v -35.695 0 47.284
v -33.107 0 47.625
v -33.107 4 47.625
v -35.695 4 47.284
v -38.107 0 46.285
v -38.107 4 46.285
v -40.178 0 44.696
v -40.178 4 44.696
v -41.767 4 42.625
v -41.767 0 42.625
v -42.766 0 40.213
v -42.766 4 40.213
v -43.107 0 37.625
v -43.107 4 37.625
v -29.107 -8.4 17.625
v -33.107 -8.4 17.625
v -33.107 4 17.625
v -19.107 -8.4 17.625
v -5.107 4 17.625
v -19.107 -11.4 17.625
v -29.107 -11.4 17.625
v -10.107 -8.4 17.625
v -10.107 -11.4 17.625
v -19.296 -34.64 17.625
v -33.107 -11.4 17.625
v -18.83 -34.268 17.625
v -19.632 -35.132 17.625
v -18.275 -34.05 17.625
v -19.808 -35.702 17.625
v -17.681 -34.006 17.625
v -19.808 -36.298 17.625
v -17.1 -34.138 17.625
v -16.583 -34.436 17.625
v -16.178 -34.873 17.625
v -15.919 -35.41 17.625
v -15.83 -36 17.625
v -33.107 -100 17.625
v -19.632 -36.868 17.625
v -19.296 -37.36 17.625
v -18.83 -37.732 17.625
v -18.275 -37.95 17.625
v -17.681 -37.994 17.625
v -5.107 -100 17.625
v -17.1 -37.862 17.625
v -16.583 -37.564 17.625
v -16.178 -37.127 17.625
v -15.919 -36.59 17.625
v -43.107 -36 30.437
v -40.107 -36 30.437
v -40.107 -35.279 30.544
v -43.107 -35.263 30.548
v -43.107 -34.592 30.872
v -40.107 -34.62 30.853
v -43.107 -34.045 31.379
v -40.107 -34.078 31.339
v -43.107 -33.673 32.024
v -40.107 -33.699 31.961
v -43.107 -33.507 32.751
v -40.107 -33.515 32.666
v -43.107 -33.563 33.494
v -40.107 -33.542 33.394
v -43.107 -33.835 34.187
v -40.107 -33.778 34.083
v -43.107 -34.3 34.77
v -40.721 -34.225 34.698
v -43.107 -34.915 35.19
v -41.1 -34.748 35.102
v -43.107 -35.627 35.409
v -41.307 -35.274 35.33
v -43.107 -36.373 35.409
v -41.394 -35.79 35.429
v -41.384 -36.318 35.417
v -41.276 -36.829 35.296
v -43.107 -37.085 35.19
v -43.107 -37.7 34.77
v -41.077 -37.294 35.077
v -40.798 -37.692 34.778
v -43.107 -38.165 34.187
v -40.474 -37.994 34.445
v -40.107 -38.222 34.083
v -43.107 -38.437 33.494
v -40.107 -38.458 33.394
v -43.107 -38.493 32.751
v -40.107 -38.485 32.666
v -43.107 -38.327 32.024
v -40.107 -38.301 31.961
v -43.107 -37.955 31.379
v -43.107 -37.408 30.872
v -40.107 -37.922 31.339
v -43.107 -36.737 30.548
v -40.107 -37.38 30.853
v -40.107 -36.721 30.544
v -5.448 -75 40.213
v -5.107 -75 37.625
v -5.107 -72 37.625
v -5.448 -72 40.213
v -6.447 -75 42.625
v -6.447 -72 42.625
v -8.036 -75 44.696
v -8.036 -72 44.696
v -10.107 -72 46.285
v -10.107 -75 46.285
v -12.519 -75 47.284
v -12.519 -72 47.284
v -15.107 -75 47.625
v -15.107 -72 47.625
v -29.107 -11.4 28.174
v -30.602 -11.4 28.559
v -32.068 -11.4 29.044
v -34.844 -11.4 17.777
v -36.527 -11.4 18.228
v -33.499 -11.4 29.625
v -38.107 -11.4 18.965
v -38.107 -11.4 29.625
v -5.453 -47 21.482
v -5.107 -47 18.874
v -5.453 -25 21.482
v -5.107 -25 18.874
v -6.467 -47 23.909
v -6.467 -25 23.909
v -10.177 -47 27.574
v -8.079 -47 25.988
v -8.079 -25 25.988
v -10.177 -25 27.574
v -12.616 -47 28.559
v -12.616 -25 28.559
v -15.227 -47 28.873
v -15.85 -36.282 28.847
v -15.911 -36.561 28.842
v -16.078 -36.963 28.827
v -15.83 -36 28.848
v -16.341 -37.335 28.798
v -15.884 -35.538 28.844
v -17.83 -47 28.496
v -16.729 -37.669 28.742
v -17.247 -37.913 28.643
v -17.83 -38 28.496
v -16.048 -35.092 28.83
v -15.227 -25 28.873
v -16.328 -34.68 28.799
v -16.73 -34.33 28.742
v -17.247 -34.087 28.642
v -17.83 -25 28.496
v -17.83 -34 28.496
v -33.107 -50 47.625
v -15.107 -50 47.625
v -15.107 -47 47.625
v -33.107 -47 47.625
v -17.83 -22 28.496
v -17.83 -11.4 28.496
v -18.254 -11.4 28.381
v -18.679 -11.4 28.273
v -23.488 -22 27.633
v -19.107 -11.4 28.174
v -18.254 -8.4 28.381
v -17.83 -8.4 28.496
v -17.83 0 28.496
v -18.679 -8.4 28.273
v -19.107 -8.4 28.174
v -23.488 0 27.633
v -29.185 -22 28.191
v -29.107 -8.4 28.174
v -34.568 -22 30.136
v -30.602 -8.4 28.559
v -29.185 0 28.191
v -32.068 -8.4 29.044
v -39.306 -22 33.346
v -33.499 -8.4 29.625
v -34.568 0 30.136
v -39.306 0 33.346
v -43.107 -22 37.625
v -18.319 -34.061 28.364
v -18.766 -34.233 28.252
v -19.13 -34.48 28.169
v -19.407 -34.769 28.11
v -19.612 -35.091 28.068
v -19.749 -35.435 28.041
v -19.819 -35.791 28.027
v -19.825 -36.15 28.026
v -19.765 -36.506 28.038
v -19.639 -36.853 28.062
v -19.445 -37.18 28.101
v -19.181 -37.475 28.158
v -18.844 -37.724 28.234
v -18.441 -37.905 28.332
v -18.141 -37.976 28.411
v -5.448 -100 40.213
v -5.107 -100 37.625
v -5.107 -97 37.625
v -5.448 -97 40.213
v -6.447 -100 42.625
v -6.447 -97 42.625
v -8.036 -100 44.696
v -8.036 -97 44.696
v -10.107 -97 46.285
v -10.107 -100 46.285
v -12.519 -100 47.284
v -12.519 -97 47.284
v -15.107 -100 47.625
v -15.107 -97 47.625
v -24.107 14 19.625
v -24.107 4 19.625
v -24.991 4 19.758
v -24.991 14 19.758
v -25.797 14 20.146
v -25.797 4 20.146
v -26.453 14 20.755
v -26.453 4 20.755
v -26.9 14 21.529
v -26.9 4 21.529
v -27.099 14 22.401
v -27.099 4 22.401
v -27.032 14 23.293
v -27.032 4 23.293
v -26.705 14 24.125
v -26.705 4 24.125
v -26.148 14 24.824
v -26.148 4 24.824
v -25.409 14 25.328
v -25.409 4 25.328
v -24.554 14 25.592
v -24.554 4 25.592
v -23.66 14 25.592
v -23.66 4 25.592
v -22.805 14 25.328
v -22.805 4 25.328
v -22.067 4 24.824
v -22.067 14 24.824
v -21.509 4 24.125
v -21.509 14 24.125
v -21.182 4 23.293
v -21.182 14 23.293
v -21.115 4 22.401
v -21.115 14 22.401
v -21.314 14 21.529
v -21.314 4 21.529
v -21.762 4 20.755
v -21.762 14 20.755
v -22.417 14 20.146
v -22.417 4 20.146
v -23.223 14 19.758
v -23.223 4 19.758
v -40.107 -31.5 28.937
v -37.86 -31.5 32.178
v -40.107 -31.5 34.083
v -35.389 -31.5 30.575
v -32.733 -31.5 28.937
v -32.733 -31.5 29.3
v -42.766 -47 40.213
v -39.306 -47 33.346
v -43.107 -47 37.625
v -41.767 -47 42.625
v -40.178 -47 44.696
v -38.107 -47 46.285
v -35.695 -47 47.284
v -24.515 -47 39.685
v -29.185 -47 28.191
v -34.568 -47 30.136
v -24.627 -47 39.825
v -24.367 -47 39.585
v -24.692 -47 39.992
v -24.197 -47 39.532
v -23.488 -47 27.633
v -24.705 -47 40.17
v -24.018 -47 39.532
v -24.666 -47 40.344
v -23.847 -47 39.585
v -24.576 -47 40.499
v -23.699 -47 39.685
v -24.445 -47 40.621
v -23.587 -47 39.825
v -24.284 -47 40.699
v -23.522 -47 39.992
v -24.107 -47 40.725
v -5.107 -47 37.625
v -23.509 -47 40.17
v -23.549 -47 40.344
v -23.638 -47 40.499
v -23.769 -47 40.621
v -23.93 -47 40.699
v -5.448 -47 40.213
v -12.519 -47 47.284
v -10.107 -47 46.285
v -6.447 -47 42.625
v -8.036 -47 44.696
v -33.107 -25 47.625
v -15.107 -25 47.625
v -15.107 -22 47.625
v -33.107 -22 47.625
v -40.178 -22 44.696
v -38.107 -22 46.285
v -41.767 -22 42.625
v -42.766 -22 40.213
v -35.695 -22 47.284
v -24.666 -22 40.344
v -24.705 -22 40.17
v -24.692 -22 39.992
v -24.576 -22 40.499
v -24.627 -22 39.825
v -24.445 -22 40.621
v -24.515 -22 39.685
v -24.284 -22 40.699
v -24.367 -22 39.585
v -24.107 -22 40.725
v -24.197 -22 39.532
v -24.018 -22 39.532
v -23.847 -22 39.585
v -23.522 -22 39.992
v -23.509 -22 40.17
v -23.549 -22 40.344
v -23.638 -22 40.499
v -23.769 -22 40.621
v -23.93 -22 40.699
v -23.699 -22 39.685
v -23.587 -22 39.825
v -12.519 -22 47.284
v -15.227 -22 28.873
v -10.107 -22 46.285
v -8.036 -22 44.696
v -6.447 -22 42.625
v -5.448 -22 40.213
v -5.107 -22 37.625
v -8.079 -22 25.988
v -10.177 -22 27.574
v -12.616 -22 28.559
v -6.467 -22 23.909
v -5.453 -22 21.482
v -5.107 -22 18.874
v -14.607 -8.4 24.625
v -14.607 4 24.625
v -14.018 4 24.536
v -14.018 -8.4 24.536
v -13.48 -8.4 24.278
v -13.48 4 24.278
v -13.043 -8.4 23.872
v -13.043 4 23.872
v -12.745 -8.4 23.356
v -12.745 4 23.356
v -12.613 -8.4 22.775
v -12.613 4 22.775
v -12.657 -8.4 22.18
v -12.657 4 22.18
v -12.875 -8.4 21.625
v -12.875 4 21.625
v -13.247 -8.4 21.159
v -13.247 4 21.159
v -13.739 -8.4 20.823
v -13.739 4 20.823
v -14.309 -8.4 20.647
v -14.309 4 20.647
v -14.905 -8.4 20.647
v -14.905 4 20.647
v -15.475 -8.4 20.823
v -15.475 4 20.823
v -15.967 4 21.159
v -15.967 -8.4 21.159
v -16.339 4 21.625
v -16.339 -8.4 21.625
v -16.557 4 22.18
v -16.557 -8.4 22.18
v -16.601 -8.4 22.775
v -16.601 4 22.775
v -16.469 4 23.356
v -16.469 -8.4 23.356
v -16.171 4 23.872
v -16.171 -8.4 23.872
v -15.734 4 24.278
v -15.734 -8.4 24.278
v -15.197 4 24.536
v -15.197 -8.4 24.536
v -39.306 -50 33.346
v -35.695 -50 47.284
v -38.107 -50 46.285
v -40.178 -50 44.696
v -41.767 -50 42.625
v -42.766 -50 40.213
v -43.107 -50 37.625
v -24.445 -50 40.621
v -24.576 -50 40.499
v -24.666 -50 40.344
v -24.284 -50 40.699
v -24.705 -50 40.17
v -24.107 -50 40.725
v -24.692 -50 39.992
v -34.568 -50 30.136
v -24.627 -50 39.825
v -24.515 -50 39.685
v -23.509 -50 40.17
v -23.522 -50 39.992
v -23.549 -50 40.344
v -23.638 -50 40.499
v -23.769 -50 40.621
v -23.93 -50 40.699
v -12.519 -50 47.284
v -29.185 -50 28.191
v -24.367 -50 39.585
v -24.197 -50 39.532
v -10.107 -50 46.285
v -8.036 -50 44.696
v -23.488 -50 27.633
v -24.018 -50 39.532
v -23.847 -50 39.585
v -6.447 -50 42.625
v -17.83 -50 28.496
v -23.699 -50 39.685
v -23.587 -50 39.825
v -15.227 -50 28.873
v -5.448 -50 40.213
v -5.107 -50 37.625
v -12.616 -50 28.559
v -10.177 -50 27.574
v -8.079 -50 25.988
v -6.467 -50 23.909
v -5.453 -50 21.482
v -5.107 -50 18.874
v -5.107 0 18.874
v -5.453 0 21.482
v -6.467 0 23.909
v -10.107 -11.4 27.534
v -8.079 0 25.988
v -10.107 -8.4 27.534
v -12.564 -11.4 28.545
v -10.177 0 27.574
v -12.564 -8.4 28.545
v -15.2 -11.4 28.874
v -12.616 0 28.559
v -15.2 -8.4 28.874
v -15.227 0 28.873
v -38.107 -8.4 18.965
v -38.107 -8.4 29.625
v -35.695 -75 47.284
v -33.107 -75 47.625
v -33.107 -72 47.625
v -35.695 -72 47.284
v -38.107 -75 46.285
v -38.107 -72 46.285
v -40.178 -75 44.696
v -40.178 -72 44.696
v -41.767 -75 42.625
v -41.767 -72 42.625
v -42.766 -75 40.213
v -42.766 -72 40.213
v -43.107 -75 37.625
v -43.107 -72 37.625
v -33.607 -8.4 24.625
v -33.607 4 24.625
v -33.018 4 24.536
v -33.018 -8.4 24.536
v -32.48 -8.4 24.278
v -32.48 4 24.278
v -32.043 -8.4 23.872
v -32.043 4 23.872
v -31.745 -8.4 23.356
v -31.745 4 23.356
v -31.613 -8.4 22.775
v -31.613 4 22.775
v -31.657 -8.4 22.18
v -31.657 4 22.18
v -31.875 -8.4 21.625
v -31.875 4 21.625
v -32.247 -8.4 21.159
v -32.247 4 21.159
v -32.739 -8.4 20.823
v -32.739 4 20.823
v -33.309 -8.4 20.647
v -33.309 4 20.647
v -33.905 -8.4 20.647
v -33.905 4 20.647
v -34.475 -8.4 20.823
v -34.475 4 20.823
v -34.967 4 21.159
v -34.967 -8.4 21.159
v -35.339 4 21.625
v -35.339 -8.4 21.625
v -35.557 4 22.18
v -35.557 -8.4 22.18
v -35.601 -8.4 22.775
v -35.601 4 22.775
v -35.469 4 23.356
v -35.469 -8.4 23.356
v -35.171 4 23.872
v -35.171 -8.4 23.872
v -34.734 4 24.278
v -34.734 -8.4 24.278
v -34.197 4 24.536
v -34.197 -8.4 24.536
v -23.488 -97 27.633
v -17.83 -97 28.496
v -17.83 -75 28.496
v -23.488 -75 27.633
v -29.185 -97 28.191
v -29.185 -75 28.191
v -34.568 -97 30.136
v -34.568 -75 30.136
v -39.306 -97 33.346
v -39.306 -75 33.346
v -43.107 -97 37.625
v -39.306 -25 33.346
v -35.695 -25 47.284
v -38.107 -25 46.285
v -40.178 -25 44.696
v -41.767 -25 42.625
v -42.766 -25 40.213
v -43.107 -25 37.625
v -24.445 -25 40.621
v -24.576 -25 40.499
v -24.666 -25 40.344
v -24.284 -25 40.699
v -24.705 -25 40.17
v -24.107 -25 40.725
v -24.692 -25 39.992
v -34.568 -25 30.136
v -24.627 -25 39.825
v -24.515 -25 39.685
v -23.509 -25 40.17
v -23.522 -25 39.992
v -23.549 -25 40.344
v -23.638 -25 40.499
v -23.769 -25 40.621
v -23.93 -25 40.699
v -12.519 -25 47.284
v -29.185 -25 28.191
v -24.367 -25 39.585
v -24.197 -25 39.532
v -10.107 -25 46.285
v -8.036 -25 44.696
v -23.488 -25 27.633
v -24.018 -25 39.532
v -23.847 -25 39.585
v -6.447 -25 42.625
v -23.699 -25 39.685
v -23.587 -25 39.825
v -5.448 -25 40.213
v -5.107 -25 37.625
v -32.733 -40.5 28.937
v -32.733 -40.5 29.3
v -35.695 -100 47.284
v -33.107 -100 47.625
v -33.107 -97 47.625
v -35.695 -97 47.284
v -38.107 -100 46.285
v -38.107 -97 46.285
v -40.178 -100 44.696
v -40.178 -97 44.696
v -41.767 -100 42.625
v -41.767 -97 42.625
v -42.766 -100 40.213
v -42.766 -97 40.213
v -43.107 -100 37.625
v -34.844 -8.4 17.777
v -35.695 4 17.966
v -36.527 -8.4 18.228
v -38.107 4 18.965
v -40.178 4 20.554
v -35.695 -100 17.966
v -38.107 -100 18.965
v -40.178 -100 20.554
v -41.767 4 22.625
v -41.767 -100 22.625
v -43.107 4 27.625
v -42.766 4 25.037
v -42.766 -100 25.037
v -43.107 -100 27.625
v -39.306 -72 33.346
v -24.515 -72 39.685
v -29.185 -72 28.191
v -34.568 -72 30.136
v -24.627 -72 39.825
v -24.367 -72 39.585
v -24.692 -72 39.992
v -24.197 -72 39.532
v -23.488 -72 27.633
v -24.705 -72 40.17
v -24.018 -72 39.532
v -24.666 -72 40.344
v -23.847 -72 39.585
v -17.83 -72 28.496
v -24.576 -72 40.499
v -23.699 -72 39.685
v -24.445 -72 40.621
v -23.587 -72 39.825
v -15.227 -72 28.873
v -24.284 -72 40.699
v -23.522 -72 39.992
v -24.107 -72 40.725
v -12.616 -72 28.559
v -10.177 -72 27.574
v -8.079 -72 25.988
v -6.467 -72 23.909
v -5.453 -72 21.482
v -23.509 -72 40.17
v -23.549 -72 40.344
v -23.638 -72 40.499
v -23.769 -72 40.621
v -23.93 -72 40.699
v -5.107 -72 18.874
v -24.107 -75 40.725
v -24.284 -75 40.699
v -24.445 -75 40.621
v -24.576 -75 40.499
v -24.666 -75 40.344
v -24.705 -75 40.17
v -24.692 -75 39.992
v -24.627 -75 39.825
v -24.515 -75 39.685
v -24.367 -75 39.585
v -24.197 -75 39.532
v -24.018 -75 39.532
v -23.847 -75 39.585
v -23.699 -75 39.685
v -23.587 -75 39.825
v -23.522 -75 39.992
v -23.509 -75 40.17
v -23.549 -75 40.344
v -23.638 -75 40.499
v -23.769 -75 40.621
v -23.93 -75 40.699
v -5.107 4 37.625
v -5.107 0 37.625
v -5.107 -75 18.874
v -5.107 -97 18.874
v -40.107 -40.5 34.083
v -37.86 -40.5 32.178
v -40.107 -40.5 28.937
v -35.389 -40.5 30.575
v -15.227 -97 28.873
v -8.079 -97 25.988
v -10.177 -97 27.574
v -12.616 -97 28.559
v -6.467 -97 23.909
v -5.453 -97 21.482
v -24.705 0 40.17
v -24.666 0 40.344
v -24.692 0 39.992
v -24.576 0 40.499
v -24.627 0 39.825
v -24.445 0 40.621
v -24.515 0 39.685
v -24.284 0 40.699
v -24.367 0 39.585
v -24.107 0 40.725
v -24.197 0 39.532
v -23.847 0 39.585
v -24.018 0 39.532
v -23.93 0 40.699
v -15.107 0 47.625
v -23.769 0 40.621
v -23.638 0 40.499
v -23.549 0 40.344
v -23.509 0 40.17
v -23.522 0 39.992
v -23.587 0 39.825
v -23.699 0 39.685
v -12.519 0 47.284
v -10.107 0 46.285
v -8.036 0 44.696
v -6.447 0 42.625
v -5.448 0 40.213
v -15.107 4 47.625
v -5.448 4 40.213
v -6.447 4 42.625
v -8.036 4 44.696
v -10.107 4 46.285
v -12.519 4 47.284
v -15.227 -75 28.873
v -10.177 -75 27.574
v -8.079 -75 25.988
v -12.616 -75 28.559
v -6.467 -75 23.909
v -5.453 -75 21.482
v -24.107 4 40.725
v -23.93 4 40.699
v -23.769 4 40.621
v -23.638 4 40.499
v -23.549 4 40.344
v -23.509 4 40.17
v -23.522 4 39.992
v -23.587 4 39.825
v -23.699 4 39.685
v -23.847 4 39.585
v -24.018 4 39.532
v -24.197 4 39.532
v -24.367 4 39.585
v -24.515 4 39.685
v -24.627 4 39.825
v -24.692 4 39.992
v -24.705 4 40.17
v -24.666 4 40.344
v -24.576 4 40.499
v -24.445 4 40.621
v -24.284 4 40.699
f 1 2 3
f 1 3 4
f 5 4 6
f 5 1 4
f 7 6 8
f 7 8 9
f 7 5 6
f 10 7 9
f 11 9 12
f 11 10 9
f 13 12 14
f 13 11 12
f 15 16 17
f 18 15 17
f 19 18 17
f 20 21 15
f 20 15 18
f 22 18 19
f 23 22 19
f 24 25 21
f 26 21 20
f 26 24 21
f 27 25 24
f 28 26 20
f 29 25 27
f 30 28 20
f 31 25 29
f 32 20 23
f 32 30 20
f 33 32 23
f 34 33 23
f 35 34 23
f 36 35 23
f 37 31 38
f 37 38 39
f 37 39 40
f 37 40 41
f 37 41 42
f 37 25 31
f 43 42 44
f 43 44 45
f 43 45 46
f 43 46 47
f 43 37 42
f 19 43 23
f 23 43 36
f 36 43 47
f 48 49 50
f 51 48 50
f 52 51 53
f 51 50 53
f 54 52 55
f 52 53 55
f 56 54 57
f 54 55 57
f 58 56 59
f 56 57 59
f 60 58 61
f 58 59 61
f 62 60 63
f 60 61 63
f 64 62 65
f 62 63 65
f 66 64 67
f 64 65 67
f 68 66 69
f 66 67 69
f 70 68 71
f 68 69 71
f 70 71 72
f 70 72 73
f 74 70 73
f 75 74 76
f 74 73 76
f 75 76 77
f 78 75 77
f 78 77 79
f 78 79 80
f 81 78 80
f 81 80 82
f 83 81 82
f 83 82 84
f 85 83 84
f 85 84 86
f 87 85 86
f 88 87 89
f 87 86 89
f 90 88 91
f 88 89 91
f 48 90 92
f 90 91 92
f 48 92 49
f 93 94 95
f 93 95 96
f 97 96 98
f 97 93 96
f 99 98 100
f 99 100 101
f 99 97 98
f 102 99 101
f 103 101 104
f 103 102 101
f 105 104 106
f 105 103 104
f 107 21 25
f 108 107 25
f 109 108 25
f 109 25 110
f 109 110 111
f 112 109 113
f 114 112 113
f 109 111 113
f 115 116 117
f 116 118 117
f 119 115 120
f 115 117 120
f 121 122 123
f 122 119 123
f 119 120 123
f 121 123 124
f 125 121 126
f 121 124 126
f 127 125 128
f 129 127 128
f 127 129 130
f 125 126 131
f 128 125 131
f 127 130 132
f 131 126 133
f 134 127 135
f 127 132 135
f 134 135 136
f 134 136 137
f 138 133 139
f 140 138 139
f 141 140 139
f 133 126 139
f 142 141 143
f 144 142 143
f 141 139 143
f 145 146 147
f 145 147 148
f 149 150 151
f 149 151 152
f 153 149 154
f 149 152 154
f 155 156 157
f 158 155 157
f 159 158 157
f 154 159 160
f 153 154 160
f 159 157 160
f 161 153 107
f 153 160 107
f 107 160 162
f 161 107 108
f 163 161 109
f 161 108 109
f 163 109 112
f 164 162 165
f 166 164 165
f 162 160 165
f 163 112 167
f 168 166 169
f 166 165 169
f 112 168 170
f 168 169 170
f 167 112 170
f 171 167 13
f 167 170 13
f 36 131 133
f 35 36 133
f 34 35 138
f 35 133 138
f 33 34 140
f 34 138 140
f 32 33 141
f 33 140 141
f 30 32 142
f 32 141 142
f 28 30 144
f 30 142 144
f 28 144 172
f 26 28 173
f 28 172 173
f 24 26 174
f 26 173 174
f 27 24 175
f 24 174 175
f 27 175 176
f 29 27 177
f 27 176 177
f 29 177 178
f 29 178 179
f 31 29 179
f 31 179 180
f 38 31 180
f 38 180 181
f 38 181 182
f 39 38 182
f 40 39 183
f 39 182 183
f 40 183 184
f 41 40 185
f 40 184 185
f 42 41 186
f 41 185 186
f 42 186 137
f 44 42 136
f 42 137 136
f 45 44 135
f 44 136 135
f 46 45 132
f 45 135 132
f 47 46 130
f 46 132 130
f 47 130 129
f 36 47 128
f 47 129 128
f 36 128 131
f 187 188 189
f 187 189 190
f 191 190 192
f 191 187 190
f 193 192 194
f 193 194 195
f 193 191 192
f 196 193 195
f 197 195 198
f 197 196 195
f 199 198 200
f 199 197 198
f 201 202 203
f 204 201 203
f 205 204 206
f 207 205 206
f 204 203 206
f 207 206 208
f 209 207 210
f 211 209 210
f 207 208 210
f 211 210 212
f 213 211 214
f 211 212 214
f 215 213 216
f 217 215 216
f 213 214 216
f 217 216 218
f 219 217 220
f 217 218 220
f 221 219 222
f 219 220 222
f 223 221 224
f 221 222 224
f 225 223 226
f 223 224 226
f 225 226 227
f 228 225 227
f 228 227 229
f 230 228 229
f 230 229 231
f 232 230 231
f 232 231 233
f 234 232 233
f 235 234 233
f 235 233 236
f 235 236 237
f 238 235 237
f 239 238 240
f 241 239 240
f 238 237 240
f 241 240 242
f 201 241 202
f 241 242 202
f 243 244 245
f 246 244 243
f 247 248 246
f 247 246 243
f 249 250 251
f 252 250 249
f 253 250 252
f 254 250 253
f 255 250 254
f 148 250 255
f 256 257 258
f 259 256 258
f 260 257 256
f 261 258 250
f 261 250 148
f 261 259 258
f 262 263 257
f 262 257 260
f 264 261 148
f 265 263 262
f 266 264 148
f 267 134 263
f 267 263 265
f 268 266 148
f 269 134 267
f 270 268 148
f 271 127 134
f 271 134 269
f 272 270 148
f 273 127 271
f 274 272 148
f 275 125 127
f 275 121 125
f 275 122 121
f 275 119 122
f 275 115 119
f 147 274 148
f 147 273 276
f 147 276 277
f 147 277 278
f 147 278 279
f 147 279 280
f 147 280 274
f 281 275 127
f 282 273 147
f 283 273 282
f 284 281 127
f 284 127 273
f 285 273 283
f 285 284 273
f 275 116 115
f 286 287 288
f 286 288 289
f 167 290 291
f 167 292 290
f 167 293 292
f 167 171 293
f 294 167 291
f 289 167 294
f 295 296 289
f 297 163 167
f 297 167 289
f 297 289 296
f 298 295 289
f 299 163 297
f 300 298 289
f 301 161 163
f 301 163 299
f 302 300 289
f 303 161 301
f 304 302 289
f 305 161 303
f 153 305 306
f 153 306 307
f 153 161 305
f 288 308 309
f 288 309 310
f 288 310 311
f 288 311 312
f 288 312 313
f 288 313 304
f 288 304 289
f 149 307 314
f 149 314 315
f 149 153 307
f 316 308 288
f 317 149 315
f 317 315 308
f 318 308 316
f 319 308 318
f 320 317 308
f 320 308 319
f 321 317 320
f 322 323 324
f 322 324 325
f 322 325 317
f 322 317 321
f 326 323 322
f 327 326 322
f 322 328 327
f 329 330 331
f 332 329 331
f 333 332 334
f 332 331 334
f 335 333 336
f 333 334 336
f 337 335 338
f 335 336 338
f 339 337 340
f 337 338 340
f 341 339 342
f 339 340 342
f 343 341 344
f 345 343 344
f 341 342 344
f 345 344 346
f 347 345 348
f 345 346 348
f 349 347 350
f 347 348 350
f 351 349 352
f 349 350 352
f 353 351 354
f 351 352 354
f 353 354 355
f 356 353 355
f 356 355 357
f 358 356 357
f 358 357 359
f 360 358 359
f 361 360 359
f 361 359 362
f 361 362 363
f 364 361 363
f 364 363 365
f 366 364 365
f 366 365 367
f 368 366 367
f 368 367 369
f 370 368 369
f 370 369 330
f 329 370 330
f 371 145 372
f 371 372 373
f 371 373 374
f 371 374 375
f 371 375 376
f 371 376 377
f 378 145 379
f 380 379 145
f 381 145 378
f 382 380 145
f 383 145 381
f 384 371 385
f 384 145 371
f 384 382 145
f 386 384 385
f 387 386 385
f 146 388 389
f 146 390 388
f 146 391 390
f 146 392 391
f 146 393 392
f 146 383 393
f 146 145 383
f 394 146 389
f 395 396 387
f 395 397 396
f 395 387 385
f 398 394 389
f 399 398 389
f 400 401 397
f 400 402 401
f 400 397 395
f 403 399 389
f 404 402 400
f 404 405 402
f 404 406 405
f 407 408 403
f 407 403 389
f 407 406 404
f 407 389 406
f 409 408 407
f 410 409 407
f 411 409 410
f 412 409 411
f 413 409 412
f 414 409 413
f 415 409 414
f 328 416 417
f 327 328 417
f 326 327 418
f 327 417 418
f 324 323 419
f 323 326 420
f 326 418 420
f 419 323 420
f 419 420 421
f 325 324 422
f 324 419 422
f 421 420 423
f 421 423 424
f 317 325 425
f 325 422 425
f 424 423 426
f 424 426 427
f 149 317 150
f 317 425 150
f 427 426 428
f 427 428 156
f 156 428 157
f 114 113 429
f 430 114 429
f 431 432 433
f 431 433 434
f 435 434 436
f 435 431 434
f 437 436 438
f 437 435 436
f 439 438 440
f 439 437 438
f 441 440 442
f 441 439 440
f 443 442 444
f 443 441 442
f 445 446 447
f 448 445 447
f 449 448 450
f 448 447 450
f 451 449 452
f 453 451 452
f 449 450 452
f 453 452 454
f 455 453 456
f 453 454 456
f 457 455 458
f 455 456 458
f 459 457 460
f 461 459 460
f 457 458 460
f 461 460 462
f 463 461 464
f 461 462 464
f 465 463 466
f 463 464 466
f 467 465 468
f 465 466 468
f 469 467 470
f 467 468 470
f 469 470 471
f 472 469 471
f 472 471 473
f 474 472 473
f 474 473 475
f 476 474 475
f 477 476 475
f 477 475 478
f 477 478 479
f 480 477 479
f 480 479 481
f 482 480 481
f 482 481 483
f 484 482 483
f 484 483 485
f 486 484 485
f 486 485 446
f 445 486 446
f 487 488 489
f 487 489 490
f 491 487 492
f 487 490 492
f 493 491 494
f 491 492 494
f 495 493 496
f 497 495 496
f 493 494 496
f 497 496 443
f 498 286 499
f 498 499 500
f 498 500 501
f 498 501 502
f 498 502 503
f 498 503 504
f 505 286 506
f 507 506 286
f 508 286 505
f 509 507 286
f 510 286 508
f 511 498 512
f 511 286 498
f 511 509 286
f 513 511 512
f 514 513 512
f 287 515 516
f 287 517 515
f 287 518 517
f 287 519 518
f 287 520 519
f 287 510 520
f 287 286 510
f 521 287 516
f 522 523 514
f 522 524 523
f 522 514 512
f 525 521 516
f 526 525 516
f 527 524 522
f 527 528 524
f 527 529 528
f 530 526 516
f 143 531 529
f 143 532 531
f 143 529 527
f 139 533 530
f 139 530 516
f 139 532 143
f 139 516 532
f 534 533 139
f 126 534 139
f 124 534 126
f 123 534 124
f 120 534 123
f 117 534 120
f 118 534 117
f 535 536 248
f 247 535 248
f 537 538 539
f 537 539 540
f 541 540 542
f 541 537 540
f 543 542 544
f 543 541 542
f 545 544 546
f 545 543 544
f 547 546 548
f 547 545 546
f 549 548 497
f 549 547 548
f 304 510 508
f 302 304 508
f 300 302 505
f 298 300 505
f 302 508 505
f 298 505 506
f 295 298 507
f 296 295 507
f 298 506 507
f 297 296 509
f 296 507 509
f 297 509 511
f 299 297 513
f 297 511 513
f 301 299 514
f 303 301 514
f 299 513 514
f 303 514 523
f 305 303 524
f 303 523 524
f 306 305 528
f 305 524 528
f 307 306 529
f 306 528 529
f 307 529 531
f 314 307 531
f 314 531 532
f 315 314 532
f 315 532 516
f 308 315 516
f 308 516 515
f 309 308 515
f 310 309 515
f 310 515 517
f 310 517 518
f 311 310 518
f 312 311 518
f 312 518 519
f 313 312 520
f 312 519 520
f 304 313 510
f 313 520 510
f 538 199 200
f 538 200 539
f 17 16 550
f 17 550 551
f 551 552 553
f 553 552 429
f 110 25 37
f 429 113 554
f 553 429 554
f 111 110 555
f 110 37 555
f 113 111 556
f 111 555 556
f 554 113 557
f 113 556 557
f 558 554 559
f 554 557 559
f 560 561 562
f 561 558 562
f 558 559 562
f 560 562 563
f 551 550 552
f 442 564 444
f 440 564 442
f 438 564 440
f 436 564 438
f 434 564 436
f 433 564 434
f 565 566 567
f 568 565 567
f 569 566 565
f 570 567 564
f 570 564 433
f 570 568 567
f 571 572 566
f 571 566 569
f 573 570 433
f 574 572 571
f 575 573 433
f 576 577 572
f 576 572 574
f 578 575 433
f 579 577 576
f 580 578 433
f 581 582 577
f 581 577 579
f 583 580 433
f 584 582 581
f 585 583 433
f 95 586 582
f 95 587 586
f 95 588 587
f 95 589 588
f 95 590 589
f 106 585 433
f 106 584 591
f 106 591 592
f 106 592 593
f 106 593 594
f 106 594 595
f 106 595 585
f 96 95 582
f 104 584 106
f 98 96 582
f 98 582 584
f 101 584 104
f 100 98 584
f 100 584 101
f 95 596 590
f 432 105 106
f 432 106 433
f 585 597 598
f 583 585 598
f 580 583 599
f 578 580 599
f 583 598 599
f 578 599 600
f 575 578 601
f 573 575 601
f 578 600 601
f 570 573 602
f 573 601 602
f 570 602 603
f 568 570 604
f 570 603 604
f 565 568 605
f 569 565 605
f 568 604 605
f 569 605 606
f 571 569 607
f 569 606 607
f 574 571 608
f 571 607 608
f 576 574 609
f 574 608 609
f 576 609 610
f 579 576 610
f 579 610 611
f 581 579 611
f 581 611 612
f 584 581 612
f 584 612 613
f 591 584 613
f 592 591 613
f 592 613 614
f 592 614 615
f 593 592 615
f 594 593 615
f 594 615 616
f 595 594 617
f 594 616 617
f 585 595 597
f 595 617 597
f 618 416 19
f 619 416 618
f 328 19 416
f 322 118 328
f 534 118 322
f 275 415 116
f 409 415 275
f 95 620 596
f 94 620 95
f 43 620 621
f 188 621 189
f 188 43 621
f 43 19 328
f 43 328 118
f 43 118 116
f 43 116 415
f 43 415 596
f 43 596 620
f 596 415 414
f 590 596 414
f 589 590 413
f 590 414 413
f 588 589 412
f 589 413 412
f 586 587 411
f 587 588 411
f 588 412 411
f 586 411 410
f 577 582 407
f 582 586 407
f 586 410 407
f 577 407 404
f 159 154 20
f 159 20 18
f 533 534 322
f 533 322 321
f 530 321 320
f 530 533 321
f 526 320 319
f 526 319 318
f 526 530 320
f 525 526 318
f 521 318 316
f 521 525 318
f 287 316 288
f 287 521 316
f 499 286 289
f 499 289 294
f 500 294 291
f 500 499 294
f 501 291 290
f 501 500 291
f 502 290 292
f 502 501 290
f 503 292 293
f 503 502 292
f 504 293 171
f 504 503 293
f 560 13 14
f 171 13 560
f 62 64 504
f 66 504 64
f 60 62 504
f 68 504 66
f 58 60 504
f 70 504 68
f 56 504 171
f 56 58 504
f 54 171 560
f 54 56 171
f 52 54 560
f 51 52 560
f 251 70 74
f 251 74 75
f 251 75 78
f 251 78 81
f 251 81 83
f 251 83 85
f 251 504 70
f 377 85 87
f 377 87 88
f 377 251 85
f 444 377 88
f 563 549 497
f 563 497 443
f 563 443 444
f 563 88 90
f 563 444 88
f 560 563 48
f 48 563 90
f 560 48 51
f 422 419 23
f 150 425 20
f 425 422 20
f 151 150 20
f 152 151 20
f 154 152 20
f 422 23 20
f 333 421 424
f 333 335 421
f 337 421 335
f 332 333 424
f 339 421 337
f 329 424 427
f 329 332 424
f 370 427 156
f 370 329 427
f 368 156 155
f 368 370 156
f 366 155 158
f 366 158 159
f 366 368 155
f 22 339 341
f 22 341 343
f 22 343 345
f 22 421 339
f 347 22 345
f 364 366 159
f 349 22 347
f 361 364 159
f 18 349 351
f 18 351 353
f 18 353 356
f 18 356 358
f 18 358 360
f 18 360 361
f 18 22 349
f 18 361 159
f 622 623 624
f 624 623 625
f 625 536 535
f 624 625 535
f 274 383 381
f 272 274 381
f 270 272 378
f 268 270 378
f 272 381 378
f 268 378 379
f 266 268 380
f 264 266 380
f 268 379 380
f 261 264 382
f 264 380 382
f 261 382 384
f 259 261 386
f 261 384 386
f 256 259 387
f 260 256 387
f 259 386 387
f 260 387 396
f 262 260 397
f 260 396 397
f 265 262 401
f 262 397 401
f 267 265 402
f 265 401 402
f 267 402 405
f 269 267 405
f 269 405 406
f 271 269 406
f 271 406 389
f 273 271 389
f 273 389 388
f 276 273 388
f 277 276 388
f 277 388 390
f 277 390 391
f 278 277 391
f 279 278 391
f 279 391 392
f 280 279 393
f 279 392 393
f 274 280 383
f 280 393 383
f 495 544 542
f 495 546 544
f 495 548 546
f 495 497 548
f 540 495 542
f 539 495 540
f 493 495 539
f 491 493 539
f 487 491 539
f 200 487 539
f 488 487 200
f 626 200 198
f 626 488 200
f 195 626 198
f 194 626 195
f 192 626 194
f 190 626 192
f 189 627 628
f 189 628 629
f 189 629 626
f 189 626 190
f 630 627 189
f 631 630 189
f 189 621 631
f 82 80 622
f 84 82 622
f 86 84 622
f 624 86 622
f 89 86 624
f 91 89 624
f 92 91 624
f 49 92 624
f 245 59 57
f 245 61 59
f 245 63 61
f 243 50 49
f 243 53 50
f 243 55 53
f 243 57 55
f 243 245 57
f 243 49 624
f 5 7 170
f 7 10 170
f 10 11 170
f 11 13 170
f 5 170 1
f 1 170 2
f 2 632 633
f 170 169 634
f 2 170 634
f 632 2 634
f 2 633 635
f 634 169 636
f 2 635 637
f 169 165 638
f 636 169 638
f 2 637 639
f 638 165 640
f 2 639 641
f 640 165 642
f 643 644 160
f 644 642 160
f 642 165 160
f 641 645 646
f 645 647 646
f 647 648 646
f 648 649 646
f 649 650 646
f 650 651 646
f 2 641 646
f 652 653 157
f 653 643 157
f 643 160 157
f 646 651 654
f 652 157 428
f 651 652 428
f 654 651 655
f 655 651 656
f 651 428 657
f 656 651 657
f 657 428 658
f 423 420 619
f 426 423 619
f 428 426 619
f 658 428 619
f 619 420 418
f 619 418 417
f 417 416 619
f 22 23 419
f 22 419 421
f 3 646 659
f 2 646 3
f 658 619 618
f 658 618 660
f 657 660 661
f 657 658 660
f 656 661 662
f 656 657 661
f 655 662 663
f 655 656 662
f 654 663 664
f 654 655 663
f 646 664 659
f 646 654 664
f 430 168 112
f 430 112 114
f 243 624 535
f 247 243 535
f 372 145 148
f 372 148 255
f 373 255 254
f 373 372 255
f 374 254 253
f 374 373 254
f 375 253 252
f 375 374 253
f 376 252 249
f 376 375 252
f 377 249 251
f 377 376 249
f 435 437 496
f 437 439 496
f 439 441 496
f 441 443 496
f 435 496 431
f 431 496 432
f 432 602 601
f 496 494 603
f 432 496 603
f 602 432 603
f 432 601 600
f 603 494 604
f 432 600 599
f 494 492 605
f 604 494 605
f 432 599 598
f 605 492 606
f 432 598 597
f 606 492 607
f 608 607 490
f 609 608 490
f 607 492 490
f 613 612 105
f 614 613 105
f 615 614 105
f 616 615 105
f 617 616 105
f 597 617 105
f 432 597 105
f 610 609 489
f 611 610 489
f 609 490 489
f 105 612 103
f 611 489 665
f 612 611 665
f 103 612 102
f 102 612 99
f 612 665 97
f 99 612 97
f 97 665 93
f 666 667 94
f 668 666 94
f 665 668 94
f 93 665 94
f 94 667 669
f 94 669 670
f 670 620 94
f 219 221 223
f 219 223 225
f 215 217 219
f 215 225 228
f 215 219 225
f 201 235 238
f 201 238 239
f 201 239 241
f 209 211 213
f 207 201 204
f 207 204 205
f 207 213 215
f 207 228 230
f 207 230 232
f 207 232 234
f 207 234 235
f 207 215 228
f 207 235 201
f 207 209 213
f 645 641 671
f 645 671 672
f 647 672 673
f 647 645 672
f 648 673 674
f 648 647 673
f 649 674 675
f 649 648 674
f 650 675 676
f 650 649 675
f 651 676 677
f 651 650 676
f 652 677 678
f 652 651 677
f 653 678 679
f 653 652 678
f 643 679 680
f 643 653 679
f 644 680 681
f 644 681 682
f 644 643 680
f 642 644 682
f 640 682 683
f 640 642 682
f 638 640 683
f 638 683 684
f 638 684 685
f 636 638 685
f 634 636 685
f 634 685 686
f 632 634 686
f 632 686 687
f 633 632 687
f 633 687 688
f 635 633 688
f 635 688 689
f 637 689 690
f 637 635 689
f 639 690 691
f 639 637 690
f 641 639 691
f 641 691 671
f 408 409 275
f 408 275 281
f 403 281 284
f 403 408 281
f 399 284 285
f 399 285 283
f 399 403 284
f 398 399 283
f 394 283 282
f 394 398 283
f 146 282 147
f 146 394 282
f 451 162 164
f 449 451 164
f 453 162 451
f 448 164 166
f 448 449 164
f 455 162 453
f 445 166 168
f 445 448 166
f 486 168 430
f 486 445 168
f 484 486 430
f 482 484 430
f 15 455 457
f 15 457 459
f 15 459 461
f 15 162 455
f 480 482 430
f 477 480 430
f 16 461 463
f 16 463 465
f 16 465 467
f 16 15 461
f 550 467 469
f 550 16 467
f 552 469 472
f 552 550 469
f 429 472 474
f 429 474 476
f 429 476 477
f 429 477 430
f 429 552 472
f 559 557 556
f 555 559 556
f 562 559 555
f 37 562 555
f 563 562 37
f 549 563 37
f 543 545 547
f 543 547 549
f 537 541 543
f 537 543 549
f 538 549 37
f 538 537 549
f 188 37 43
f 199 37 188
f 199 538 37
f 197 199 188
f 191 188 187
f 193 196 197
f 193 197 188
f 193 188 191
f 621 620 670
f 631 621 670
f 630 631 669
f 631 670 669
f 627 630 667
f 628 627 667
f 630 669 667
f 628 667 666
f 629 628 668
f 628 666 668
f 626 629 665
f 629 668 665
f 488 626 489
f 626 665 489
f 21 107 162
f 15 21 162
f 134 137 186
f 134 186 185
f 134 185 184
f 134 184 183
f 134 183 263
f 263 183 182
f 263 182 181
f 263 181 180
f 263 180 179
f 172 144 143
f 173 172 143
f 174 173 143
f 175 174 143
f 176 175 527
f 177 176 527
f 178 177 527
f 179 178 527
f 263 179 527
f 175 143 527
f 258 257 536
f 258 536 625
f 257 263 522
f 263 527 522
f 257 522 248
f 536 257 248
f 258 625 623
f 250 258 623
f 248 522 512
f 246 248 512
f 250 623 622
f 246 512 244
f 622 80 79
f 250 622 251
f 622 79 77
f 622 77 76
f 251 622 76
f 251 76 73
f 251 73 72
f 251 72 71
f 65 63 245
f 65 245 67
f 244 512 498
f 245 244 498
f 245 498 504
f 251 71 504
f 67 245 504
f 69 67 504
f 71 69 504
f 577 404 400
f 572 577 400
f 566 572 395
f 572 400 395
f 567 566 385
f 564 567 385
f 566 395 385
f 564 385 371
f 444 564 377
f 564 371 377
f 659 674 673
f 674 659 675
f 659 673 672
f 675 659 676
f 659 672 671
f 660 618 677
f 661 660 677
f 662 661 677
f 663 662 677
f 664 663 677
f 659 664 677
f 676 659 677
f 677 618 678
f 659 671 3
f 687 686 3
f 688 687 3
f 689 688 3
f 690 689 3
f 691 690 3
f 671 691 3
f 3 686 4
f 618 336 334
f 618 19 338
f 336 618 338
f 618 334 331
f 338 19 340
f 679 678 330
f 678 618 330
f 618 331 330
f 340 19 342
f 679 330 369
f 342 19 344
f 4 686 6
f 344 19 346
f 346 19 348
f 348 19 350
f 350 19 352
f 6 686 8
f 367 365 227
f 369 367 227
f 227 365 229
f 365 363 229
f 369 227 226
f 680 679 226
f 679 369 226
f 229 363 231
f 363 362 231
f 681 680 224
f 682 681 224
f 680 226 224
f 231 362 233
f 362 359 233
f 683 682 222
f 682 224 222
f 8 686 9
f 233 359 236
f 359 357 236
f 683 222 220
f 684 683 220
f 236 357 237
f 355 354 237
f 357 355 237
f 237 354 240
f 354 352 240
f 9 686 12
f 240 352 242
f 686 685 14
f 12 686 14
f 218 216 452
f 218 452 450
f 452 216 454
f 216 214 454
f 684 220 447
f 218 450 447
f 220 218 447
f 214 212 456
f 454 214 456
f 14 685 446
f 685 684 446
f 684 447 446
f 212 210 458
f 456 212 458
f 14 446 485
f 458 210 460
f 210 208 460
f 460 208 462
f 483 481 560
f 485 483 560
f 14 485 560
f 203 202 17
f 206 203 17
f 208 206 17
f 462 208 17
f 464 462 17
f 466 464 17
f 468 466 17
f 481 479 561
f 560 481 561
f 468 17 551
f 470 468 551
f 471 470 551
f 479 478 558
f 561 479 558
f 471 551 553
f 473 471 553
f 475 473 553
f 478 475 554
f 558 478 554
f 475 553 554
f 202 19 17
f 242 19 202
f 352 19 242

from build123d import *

# Parameters (mm, degrees)
CROQUIS2_R               = 0.6
SALIENTE_EXTRUIR1_DEPTH  = 4
SALIENTE_EXTRUIR2_DEPTH  = 22
CROQUIS4_R               = 2
CORTAR_EXTRUIR1_DEPTH    = 15.4
CROQUIS5_W               = 9
CROQUIS5_H               = 3
CORTAR_EXTRUIR2_DEPTH    = 12
SALIENTE_EXTRUIR4_DEPTH  = 25
SALIENTE_EXTRUIR5_START  = 3
CROQUIS6_R               = 0.6
SALIENTE_EXTRUIR5_DEPTH  = 3
SALIENTE_EXTRUIR10_DEPTH = 25
SALIENTE_EXTRUIR11_START = 3
CROQUIS17_R              = 0.6
SALIENTE_EXTRUIR11_DEPTH = 3
SALIENTE_EXTRUIR12_DEPTH = 25
SALIENTE_EXTRUIR13_START = 3
CROQUIS18_R              = 0.6
SALIENTE_EXTRUIR13_DEPTH = 3
SALIENTE_EXTRUIR14_START = 3
SALIENTE_EXTRUIR14_DEPTH = 3
REDONDEO1_R              = 10
REDONDEO2_R              = 10
CROQUIS22_R              = 3
SALIENTE_EXTRUIR15_DEPTH = 10
CROQUIS25_W              = 6
CROQUIS25_H              = 9
CORTAR_EXTRUIR3_DEPTH    = 35
CROQUIS26_R              = 2.5
CORTAR_EXTRUIR4_DEPTH    = 3
CROQUIS27_W              = 7.374121946
CROQUIS27_H              = 9
CORTAR_EXTRUIR5_DEPTH    = 1
CROQUIS29_R              = 2
CORTAR_EXTRUIR6_DEPTH    = 11.312254328


with BuildPart() as part:
    # Croquis2 → Saliente-Extruir1 (new body)
    with BuildSketch(Plane(origin=(0, 0, 0), x_dir=(1, 0, 0), z_dir=(0, 1, 0))):
        with BuildLine():
            Line((-43.107082341, -17.625158928), (-5.107082341, -17.625158928))
            Line((-5.107082341, -17.625158928), (-5.107082341, -37.625158928))
            ThreePointArc((-5.107082341, -37.625158928), (-8.036014529, -44.69622674), (-15.107082341, -47.625158928))
            Line((-15.107082341, -47.625158928), (-33.107082341, -47.625158928))
            ThreePointArc((-33.107082341, -47.625158928), (-40.178150153, -44.69622674), (-43.107082341, -37.625158928))
            Line((-43.107082341, -37.625158928), (-43.107082341, -17.625158928))
        make_face()
        with Locations(Location((-24.107082341, -40.125158928, 0), (0, 0, 270))):
            Circle(CROQUIS2_R, mode=Mode.SUBTRACT)
    extrude(amount=SALIENTE_EXTRUIR1_DEPTH)

    # Croquis3 → Saliente-Extruir2 (add)
    with BuildSketch(Plane.XZ):
        with BuildLine():
            Line((-43.107082341, 17.625158928), (-5.107082341, 17.625158928))
            Line((-5.107082341, 17.625158928), (-5.107082341, 37.625158928))
            ThreePointArc((-5.107082341, 37.625158928), (-24.107082341, 27.625158928), (-43.107082341, 37.625158928))
            Line((-43.107082341, 37.625158928), (-43.107082341, 17.625158928))
        make_face()
    extrude(amount=SALIENTE_EXTRUIR2_DEPTH)

    # Croquis4 → Cortar-Extruir1 (cut)
    with BuildSketch(Plane(origin=(0, 4, 0), x_dir=(1, 0, 0), z_dir=(0, 1, 0))):
        with Locations(Location((-33.607082341, -22.625158928, 0), (0, 0, 270))):
            Circle(CROQUIS4_R)
        with Locations(Location((-14.607082341, -22.625158928, 0), (0, 0, 270))):
            Circle(CROQUIS4_R)
    extrude(amount=-CORTAR_EXTRUIR1_DEPTH, mode=Mode.SUBTRACT)

    # Croquis5 → Cortar-Extruir2 (cut)
    with BuildSketch(Plane(origin=(0, 0, 17.625158928), x_dir=(-1, 0, 0), z_dir=(0, 0, -1))):
        with Locations((33.607082341, -9.9)):
            Rectangle(CROQUIS5_W, CROQUIS5_H)
        with Locations((14.607082341, -9.9)):
            Rectangle(CROQUIS5_W, CROQUIS5_H)
    extrude(amount=-CORTAR_EXTRUIR2_DEPTH, mode=Mode.SUBTRACT)

    # Croquis9 → Saliente-Extruir4 (add)
    with BuildSketch(Plane.XZ.offset(22)):
        with BuildLine():
            Line((-43.107082341, 37.625158928), (-43.107082341, 17.625158928))
            Line((-43.107082341, 17.625158928), (-5.107082341, 17.625158928))
            Line((-5.107082341, 17.625158928), (-5.107082341, 37.625158928))
            ThreePointArc((-5.107082341, 37.625158928), (-24.107082341, 27.625158928), (-43.107082341, 37.625158928))
        make_face()
    extrude(amount=SALIENTE_EXTRUIR4_DEPTH)

    # Croquis6 → Saliente-Extruir5 (add)
    with BuildSketch(Plane.XZ.offset(22).offset(SALIENTE_EXTRUIR5_START)):
        with BuildLine():
            Line((-43.107082341, 17.625158928), (-5.107082341, 17.625158928))
            Line((-5.107082341, 17.625158928), (-5.107082341, 37.625158928))
            ThreePointArc((-5.107082341, 37.625158928), (-8.036014529, 44.69622674), (-15.107082341, 47.625158928))
            Line((-15.107082341, 47.625158928), (-33.107082341, 47.625158928))
            ThreePointArc((-33.107082341, 47.625158928), (-40.178150153, 44.69622674), (-43.107082341, 37.625158928))
            Line((-43.107082341, 37.625158928), (-43.107082341, 17.625158928))
        make_face()
        with Locations(Location((-24.107082341, 40.125158928, 0), (0, 0, 90))):
            Circle(CROQUIS6_R, mode=Mode.SUBTRACT)
    extrude(amount=-SALIENTE_EXTRUIR5_DEPTH)

    # Croquis16 → Saliente-Extruir10 (add)
    with BuildSketch(Plane.XZ.offset(47)):
        with BuildLine():
            Line((-43.107082341, 37.625158928), (-43.107082341, 17.625158928))
            Line((-43.107082341, 17.625158928), (-5.107082341, 17.625158928))
            Line((-5.107082341, 17.625158928), (-5.107082341, 37.625158928))
            ThreePointArc((-5.107082341, 37.625158928), (-24.107082341, 27.625158928), (-43.107082341, 37.625158928))
        make_face()
    extrude(amount=SALIENTE_EXTRUIR10_DEPTH)

    # Croquis17 → Saliente-Extruir11 (add)
    with BuildSketch(Plane.XZ.offset(47).offset(SALIENTE_EXTRUIR11_START)):
        with BuildLine():
            Line((-43.107082341, 17.625158928), (-5.107082341, 17.625158928))
            Line((-5.107082341, 17.625158928), (-5.107082341, 37.625158928))
            ThreePointArc((-5.107082341, 37.625158928), (-8.036014529, 44.69622674), (-15.107082341, 47.625158928))
            Line((-15.107082341, 47.625158928), (-33.107082341, 47.625158928))
            ThreePointArc((-33.107082341, 47.625158928), (-40.178150153, 44.69622674), (-43.107082341, 37.625158928))
            Line((-43.107082341, 37.625158928), (-43.107082341, 17.625158928))
        make_face()
        with Locations(Location((-24.107082341, 40.125158928, 0), (0, 0, 90))):
            Circle(CROQUIS17_R, mode=Mode.SUBTRACT)
    extrude(amount=-SALIENTE_EXTRUIR11_DEPTH)

    # Croquis20 → Saliente-Extruir12 (add)
    with BuildSketch(Plane.XZ.offset(72)):
        with BuildLine():
            Line((-43.107082341, 37.625158928), (-43.107082341, 17.625158928))
            Line((-43.107082341, 17.625158928), (-5.107082341, 17.625158928))
            Line((-5.107082341, 17.625158928), (-5.107082341, 37.625158928))
            ThreePointArc((-5.107082341, 37.625158928), (-24.107082341, 27.625158928), (-43.107082341, 37.625158928))
        make_face()
    extrude(amount=SALIENTE_EXTRUIR12_DEPTH)

    # Croquis18 → Saliente-Extruir13 (add)
    with BuildSketch(Plane.XZ.offset(72).offset(SALIENTE_EXTRUIR13_START)):
        with BuildLine():
            Line((-43.107082341, 17.625158928), (-5.107082341, 17.625158928))
            Line((-5.107082341, 17.625158928), (-5.107082341, 37.625158928))
            ThreePointArc((-5.107082341, 37.625158928), (-8.036014529, 44.69622674), (-15.107082341, 47.625158928))
            Line((-15.107082341, 47.625158928), (-33.107082341, 47.625158928))
            ThreePointArc((-33.107082341, 47.625158928), (-40.178150153, 44.69622674), (-43.107082341, 37.625158928))
            Line((-43.107082341, 37.625158928), (-43.107082341, 17.625158928))
        make_face()
        with Locations(Location((-24.107082341, 40.125158928, 0), (0, 0, 90))):
            Circle(CROQUIS18_R, mode=Mode.SUBTRACT)
    extrude(amount=-SALIENTE_EXTRUIR13_DEPTH)

    # Croquis21 → Saliente-Extruir14 (add)
    with BuildSketch(Plane.XZ.offset(97).offset(SALIENTE_EXTRUIR14_START)):
        with BuildLine():
            Line((-43.107082341, 17.625158928), (-5.107082341, 17.625158928))
            Line((-5.107082341, 17.625158928), (-5.107082341, 37.625158928))
            ThreePointArc((-5.107082341, 37.625158928), (-8.036014529, 44.69622674), (-15.107082341, 47.625158928))
            Line((-15.107082341, 47.625158928), (-33.107082341, 47.625158928))
            ThreePointArc((-33.107082341, 47.625158928), (-40.178150153, 44.69622674), (-43.107082341, 37.625158928))
            Line((-43.107082341, 37.625158928), (-43.107082341, 17.625158928))
        make_face()
    extrude(amount=-SALIENTE_EXTRUIR14_DEPTH)

    # Redondeo1
    # the kernel refuses this fillet: 10 mm, written as the material it takes off along each edge
    with BuildSketch(Plane(origin=(-5.107082341, -28.122543277, 37.625158928), x_dir=(-0.8124951373534511, 0, -0.5829679680539889), z_dir=(0, -1, 0))) as redondeo1_piece_1_section:
        with BuildLine():
            CenterArc((19.056173651, 9.405402575), REDONDEO1_R, 144.340434386, 105.802050026)
            Line((10.931222277, 15.235082256), (0, 0))
            ThreePointArc((0, 0), (7.829675627, 1.370547065), (15.659351253, 0))
        make_face()
    redondeo1_piece_1 = extrude(amount=115.754913446, mode=Mode.PRIVATE)
    redondeo1_piece_1 = split(redondeo1_piece_1, bisect_by=Plane(origin=(-9.572700752, -47, 31.607563131), z_dir=(0, 1, 0)), keep=Keep.TOP, mode=Mode.PRIVATE)
    add(redondeo1_piece_1, mode=Mode.SUBTRACT)
    with BuildSketch(Plane(origin=(-5.107082341, -28.122543277, 37.625158928), x_dir=(-0.8124951373534511, 0, -0.5829679680539889), z_dir=(0, -1, 0))) as redondeo1_piece_2_section:
        with BuildLine():
            CenterArc((19.056173651, 9.405402575), REDONDEO1_R, 144.340434386, 105.802050026)
            Line((10.931222277, 15.235082256), (0, 0))
            ThreePointArc((0, 0), (7.829675627, 1.370547065), (15.659351253, 0))
        make_face()
    redondeo1_piece_2 = extrude(amount=115.754913446, mode=Mode.PRIVATE)
    redondeo1_piece_2 = split(redondeo1_piece_2, bisect_by=Plane(origin=(-9.572700752, -50, 31.607563131), z_dir=(0, -1, 0)), keep=Keep.TOP, mode=Mode.PRIVATE)
    redondeo1_piece_2 = split(redondeo1_piece_2, bisect_by=Plane(origin=(-9.572700752, -72, 31.607563131), z_dir=(0, 1, 0)), keep=Keep.TOP, mode=Mode.PRIVATE)
    add(redondeo1_piece_2, mode=Mode.SUBTRACT)
    with BuildSketch(Plane(origin=(-5.107082341, -75, 37.625158928), x_dir=(-0.8124951373534507, 0, -0.5829679680539895), z_dir=(0, -1, 0)), Plane(origin=(-5.107082341, -50, 37.625158928), x_dir=(-0.8124951373534507, 0, -0.5829679680539895), z_dir=(0, -1, 0)), Plane(origin=(-5.107082341, 0, 37.625158928), x_dir=(-0.8124951373534509, 0, -0.582967968053989), z_dir=(0, -1, 0))) as redondeo1_piece_3:
        with BuildLine():
            CenterArc((19.056173651, 9.405402575), REDONDEO1_R, 144.340434386, 105.802050026)
            Line((10.931222277, 15.235082256), (0, 0))
            ThreePointArc((0, 0), (7.829675627, 1.370547065), (15.659351253, 0))
        make_face()
    extrude(amount=22, mode=Mode.SUBTRACT)
    with BuildSketch(Plane(origin=(-5.107082341, -3.122543277, 37.625158928), x_dir=(-0.8124951373534511, 0, -0.5829679680539889), z_dir=(0, -1, 0))) as redondeo1_piece_4_section:
        with BuildLine():
            CenterArc((19.056173651, 9.405402575), REDONDEO1_R, 144.340434386, 105.802050026)
            Line((10.931222277, 15.235082256), (0, 0))
            ThreePointArc((0, 0), (7.829675627, 1.370547065), (15.659351253, 0))
        make_face()
    redondeo1_piece_4 = extrude(amount=115.754913446, mode=Mode.PRIVATE)
    redondeo1_piece_4 = split(redondeo1_piece_4, bisect_by=Plane(origin=(-12.770805832, -22, 29.1011401), z_dir=(0, 1, 0)), keep=Keep.TOP, mode=Mode.PRIVATE)
    add(redondeo1_piece_4, mode=Mode.SUBTRACT)
    with BuildSketch(Plane(origin=(-5.107082341, -3.122543277, 37.625158928), x_dir=(-0.8124951373534511, 0, -0.5829679680539889), z_dir=(0, -1, 0))) as redondeo1_piece_5_section:
        with BuildLine():
            CenterArc((19.056173651, 9.405402575), REDONDEO1_R, 144.340434386, 105.802050026)
            Line((10.931222277, 15.235082256), (0, 0))
            ThreePointArc((0, 0), (7.829675627, 1.370547065), (15.659351253, 0))
        make_face()
    redondeo1_piece_5 = extrude(amount=115.754913446, mode=Mode.PRIVATE)
    redondeo1_piece_5 = split(redondeo1_piece_5, bisect_by=Plane(origin=(-12.770805832, -25, 29.1011401), z_dir=(0, -1, 0)), keep=Keep.TOP, mode=Mode.PRIVATE)
    redondeo1_piece_5 = split(redondeo1_piece_5, bisect_by=Plane(origin=(-12.770805832, -47, 29.1011401), z_dir=(0, 1, 0)), keep=Keep.TOP, mode=Mode.PRIVATE)
    add(redondeo1_piece_5, mode=Mode.SUBTRACT)
    with BuildSketch(Plane(origin=(-5.107082341, -3.122543277, 37.625158928), x_dir=(-0.8124951373534511, 0, -0.5829679680539889), z_dir=(0, -1, 0))) as redondeo1_piece_6_section:
        with BuildLine():
            CenterArc((19.056173651, 9.405402575), REDONDEO1_R, 144.340434386, 105.802050026)
            Line((10.931222277, 15.235082256), (0, 0))
            ThreePointArc((0, 0), (7.829675627, 1.370547065), (15.659351253, 0))
        make_face()
    redondeo1_piece_6 = extrude(amount=115.754913446, mode=Mode.PRIVATE)
    redondeo1_piece_6 = split(redondeo1_piece_6, bisect_by=Plane(origin=(-12.770805832, -75, 29.1011401), z_dir=(0, -1, 0)), keep=Keep.TOP, mode=Mode.PRIVATE)
    redondeo1_piece_6 = split(redondeo1_piece_6, bisect_by=Plane(origin=(-12.770805832, -97, 29.1011401), z_dir=(0, 1, 0)), keep=Keep.TOP, mode=Mode.PRIVATE)
    add(redondeo1_piece_6, mode=Mode.SUBTRACT)
    with BuildSketch(Plane(origin=(-5.107082341, 46.877456723, 37.625158928), x_dir=(-0.812495137353451, 0, -0.582967968053989), z_dir=(0, -1, 0))) as redondeo1_piece_7_section:
        with BuildLine():
            CenterArc((19.056173651, 9.405402575), REDONDEO1_R, 144.340434386, 105.802050026)
            Line((10.931222277, 15.235082256), (0, 0))
            ThreePointArc((0, 0), (7.829675627, 1.370547065), (15.659351253, 0))
        make_face()
    redondeo1_piece_7 = extrude(amount=115.754913446, mode=Mode.PRIVATE)
    redondeo1_piece_7 = split(redondeo1_piece_7, bisect_by=Plane(origin=(-12.770805832, -25, 29.1011401), z_dir=(0, -1, 0)), keep=Keep.TOP, mode=Mode.PRIVATE)
    redondeo1_piece_7 = split(redondeo1_piece_7, bisect_by=Plane(origin=(-12.770805832, -47, 29.1011401), z_dir=(0, 1, 0)), keep=Keep.TOP, mode=Mode.PRIVATE)
    add(redondeo1_piece_7, mode=Mode.SUBTRACT)
    with BuildSketch(Plane(origin=(-5.107082341, 46.877456723, 37.625158928), x_dir=(-0.812495137353451, 0, -0.582967968053989), z_dir=(0, -1, 0))) as redondeo1_piece_8_section:
        with BuildLine():
            CenterArc((19.056173651, 9.405402575), REDONDEO1_R, 144.340434386, 105.802050026)
            Line((10.931222277, 15.235082256), (0, 0))
            ThreePointArc((0, 0), (7.829675627, 1.370547065), (15.659351253, 0))
        make_face()
    redondeo1_piece_8 = extrude(amount=115.754913446, mode=Mode.PRIVATE)
    redondeo1_piece_8 = split(redondeo1_piece_8, bisect_by=Plane(origin=(-12.770805832, -50, 29.1011401), z_dir=(0, -1, 0)), keep=Keep.TOP, mode=Mode.PRIVATE)
    add(redondeo1_piece_8, mode=Mode.SUBTRACT)

    # Redondeo2
    # the kernel refuses this fillet: 10 mm, written as the material it takes off along each edge
    with BuildSketch(Plane(origin=(-43.107082341, -125, 17.625158928), x_dir=(1, 0, 0), z_dir=(0, 1, 0))) as redondeo2_piece_1:
        with BuildLine():
            CenterArc((REDONDEO2_R, -REDONDEO2_R), REDONDEO2_R, 90, 90)
            Line((0, -REDONDEO2_R), (0, 0))
            Line((0, 0), (REDONDEO2_R, 0))
        make_face()
    extrude(amount=154, mode=Mode.SUBTRACT)

    # Croquis22 → Saliente-Extruir15 (add)
    with BuildSketch(Plane(origin=(0, 4, 0), x_dir=(1, 0, 0), z_dir=(0, 1, 0))):
        with Locations(Location((-24.107082341, -22.625158928, 0), (0, 0, 90))):
            Circle(CROQUIS22_R)
    extrude(amount=SALIENTE_EXTRUIR15_DEPTH)

    # Croquis25 → Cortar-Extruir3 (cut)
    with BuildSketch(Plane(origin=(-5.107082341, 0, 0), x_dir=(0, 0, -1), z_dir=(1, 0, 0))):
        with Locations((-32.937413255, -36)):
            Rectangle(CROQUIS25_W, CROQUIS25_H)
    extrude(amount=-CORTAR_EXTRUIR3_DEPTH, mode=Mode.SUBTRACT)

    # Croquis26 → Cortar-Extruir4 (cut)
    with BuildSketch(Plane(origin=(-40.107082341, 0, 0), x_dir=(0, 0, -1), z_dir=(1, 0, 0))):
        with Locations((-32.937413255, -36)):
            Circle(CROQUIS26_R)
    extrude(amount=-CORTAR_EXTRUIR4_DEPTH, mode=Mode.SUBTRACT)

    # Croquis27 → Cortar-Extruir5 (cut)
    with BuildSketch(Plane.XY.offset(29.937413255)):
        with Locations((-36.420021368, -36)):
            Rectangle(CROQUIS27_W, CROQUIS27_H)
    extrude(amount=-CORTAR_EXTRUIR5_DEPTH, mode=Mode.SUBTRACT)

    # Croquis29 → Cortar-Extruir6 (cut)
    with BuildSketch(Plane.XY.offset(28.937413255)):
        with Locations((-17.830229088, -36)):
            Circle(CROQUIS29_R)
    extrude(amount=-CORTAR_EXTRUIR6_DEPTH, mode=Mode.SUBTRACT)


solid = part.part
